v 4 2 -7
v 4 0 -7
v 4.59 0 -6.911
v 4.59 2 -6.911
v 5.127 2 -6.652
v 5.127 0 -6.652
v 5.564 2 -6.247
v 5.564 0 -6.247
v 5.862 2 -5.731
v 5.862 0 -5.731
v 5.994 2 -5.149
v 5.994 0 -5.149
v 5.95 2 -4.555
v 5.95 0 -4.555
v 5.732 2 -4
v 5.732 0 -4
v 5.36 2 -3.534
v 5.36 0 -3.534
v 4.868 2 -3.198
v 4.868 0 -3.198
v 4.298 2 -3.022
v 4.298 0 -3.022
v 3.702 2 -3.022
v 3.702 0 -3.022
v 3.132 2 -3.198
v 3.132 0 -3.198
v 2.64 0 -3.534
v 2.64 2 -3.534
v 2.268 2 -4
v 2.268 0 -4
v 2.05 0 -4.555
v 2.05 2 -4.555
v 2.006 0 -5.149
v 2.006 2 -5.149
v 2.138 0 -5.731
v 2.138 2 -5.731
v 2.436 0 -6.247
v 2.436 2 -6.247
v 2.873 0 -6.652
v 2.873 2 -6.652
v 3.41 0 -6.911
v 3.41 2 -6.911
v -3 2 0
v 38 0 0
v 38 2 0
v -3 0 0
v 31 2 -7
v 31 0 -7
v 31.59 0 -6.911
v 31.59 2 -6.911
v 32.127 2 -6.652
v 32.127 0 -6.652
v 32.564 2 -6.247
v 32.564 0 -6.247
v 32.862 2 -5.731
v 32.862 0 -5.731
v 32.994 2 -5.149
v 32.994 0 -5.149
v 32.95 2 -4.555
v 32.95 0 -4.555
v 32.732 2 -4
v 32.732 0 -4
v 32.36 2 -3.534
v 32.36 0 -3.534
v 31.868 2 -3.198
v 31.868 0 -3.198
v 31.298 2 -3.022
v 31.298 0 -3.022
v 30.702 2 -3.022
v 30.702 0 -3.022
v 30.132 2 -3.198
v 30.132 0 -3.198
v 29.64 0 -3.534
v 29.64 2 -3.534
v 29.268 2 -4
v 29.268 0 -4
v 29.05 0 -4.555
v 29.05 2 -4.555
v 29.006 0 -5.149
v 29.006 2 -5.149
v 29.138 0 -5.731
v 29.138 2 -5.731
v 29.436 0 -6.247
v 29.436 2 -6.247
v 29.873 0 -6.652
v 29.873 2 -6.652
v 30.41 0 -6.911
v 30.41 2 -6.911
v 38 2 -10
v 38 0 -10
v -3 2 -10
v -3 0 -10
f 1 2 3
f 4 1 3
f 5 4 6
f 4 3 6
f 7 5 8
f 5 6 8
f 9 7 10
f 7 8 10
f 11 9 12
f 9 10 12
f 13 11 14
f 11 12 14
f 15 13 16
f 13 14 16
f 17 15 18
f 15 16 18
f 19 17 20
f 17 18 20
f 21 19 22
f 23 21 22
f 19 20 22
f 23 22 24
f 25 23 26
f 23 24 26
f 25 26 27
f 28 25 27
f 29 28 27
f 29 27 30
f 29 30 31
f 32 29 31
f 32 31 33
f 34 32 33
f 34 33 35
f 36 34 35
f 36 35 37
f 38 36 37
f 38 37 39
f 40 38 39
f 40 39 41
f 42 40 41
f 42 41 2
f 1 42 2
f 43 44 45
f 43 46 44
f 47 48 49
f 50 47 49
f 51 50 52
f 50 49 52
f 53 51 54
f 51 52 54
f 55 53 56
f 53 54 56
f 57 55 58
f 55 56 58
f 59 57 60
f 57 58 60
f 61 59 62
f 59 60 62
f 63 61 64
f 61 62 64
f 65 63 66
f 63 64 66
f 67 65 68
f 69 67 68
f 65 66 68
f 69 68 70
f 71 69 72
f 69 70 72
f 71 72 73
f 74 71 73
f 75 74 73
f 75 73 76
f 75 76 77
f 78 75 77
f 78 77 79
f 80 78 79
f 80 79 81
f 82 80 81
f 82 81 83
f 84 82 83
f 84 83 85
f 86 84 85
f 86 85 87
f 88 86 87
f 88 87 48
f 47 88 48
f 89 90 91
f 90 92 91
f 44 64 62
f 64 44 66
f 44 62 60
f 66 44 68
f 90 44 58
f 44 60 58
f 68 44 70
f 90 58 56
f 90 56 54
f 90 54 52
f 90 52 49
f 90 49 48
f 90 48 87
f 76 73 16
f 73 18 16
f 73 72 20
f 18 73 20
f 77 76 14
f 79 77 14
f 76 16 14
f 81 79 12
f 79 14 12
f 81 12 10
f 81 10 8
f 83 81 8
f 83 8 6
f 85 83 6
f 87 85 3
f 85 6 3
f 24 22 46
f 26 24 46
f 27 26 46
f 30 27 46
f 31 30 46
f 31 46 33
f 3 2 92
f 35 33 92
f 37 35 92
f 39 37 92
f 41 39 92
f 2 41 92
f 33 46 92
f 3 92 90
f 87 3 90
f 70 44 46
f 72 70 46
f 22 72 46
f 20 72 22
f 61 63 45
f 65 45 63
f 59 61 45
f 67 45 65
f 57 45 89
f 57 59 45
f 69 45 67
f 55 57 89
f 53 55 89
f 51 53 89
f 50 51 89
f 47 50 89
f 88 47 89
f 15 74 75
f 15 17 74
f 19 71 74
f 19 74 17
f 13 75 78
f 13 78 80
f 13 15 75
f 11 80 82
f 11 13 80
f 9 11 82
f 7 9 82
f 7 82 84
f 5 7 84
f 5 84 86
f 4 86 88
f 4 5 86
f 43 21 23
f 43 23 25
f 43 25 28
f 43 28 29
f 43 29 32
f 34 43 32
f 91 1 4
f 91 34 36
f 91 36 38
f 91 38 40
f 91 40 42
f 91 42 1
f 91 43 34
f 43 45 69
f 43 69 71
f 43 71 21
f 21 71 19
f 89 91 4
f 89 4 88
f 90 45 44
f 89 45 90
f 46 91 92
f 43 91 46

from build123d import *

# Parameters (mm, degrees)
SKETCH1_W           = 35
SKETCH1_H           = 10
BOSS_EXTRUDE1_DEPTH = 2
SKETCH4_R           = 2
CUT_EXTRUDE2_DEPTH  = 20
SKETCH5_W           = 10
SKETCH5_H           = 2
BOSS_EXTRUDE3_DEPTH = 3
SKETCH6_W           = 10
SKETCH6_H           = 2
BOSS_EXTRUDE4_DEPTH = 3


with BuildPart() as part:
    # Sketch1 → Boss-Extrude1 (new body)
    with BuildSketch(Plane(origin=(0, 0, 0), x_dir=(1, 0, 0), z_dir=(0, 1, 0))):
        with Locations((17.5, 5)):
            Rectangle(SKETCH1_W, SKETCH1_H)
    extrude(amount=BOSS_EXTRUDE1_DEPTH)

    # Sketch4 → Cut-Extrude2 (cut)
    with BuildSketch(Plane.XZ):
        with Locations(Location((4, -5, 0), (0, 0, 270))):
            Circle(SKETCH4_R)
        with Locations(Location((31, -5, 0), (0, 0, 270))):
            Circle(SKETCH4_R)
    extrude(amount=-CUT_EXTRUDE2_DEPTH, mode=Mode.SUBTRACT)

    # Sketch5 → Boss-Extrude3 (add)
    with BuildSketch(Plane.ZY):
        with Locations((-5, 1)):
            Rectangle(SKETCH5_W, SKETCH5_H)
    extrude(amount=BOSS_EXTRUDE3_DEPTH)

    # Sketch6 → Boss-Extrude4 (add)
    with BuildSketch(Plane(origin=(35, 0, 0), x_dir=(0, 0, -1), z_dir=(1, 0, 0))):
        with Locations((5, 1)):
            Rectangle(SKETCH6_W, SKETCH6_H)
    extrude(amount=BOSS_EXTRUDE4_DEPTH)


solid = part.part
